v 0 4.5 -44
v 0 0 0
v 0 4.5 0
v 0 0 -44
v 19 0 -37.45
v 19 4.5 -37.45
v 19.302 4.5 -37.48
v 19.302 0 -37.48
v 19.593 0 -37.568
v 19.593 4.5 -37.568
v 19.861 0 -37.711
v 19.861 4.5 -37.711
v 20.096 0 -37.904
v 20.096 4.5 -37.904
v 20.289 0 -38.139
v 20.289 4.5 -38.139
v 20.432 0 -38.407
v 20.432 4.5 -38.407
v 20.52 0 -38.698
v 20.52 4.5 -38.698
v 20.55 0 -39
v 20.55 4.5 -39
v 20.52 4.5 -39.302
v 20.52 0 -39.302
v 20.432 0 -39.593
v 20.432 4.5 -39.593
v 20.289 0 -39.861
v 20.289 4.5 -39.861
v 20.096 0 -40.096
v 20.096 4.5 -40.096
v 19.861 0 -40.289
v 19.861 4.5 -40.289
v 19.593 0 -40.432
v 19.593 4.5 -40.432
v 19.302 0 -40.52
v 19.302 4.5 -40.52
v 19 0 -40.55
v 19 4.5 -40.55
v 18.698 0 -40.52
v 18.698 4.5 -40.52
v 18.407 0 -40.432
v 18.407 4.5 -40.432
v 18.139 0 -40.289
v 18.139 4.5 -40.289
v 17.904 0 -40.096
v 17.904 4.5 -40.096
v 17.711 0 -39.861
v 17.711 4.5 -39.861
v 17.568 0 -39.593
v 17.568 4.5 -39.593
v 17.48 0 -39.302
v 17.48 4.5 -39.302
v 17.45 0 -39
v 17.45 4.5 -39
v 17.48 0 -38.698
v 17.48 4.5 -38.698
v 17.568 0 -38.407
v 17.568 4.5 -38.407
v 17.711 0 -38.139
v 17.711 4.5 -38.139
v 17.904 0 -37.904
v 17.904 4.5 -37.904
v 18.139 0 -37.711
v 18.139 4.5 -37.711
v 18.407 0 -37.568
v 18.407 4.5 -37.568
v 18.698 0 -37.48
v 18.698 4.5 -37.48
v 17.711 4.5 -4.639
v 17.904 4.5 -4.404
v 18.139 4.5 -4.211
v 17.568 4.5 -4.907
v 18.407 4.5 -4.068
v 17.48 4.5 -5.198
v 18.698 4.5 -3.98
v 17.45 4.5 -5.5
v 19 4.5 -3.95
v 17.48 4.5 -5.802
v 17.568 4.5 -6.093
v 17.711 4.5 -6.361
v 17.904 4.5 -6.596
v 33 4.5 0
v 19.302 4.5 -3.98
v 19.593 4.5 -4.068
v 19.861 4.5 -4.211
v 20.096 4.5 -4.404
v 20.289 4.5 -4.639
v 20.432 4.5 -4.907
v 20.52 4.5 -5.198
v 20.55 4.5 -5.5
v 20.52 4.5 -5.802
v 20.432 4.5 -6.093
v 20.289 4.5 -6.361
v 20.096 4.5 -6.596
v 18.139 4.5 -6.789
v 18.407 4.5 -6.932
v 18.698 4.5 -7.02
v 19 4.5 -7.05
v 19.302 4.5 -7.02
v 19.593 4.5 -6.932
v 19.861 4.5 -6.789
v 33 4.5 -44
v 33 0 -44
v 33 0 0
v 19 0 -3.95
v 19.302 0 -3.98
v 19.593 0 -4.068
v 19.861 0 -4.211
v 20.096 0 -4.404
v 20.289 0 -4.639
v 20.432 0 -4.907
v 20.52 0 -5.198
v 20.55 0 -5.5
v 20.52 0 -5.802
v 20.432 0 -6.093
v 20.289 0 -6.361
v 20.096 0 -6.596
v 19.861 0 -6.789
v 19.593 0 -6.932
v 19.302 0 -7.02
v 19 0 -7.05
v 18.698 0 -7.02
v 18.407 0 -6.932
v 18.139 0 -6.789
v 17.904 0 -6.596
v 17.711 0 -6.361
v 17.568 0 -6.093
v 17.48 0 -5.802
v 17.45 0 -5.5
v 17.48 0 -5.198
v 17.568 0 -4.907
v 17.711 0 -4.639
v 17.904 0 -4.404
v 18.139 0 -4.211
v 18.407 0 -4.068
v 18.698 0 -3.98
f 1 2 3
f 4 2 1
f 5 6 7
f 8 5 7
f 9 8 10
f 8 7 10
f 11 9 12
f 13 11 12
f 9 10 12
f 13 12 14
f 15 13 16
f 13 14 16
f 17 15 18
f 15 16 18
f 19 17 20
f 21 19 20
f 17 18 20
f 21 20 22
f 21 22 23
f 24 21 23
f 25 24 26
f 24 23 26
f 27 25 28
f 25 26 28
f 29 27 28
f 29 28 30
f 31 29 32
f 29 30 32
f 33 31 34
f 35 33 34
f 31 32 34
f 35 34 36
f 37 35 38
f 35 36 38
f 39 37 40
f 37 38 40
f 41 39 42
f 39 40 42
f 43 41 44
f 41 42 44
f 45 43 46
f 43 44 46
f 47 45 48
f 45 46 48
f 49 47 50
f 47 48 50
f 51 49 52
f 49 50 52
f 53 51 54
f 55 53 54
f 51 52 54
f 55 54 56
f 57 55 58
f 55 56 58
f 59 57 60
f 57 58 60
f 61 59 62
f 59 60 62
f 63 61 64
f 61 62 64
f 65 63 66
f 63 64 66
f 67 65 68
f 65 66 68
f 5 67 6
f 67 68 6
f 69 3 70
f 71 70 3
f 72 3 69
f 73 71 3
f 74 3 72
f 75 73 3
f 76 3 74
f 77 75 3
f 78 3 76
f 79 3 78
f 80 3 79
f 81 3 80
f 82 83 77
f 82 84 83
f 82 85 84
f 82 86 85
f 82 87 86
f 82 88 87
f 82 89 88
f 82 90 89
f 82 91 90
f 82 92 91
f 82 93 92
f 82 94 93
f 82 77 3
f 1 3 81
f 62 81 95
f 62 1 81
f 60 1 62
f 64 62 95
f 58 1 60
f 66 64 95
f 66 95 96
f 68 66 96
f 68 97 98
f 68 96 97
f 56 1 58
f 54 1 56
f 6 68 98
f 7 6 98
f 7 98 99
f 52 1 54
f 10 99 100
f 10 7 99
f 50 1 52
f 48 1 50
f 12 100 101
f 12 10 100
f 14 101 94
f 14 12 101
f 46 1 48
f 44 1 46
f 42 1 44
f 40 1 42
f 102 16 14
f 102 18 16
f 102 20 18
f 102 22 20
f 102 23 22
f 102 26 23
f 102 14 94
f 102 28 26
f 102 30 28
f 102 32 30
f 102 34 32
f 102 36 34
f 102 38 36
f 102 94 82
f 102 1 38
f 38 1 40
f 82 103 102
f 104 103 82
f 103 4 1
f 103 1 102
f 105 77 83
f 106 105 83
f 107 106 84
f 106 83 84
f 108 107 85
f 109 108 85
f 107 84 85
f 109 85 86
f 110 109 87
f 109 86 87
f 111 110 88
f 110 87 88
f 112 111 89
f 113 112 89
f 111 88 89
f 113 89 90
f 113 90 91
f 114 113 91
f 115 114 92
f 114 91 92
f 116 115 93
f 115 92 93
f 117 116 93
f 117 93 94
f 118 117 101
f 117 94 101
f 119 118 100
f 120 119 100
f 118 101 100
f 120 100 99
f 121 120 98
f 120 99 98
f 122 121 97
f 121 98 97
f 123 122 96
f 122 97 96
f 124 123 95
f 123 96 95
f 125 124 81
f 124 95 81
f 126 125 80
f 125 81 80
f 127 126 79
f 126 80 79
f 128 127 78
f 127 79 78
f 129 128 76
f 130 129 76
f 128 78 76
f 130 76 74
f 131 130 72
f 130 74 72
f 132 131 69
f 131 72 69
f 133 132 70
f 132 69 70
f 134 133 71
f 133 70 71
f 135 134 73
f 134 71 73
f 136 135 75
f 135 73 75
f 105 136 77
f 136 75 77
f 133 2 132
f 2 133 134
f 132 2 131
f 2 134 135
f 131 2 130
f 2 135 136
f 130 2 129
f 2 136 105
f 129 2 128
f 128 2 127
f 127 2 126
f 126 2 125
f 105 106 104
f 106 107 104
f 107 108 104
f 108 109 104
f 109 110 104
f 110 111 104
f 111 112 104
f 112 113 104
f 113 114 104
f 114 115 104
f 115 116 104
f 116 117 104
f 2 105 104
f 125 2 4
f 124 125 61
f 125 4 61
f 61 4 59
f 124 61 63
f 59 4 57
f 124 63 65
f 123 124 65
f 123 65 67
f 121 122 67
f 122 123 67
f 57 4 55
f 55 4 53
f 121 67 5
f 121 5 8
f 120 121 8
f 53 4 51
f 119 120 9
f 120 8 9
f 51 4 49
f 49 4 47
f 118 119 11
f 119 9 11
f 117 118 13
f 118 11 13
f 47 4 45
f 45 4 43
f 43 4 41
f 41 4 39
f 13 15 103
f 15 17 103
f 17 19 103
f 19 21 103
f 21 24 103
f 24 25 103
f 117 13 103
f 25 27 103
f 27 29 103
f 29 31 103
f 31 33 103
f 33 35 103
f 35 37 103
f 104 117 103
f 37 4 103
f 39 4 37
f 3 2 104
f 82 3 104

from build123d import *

# Parameters (mm, degrees)
CROQUIS1_W              = 37
CROQUIS1_H              = 44
SALIENTE_EXTRUIR1_DEPTH = 4.5
CROQUIS2_R              = 1.55
CORTAR_EXTRUIR1_DEPTH   = 4.5
CROQUIS3_W              = 1.5
CROQUIS3_H              = 44
CORTAR_EXTRUIR2_DEPTH   = 1
CROQUIS4_W              = 1.5
CROQUIS4_H              = 44
CORTAR_EXTRUIR3_DEPTH   = 1
CROQUIS8_W              = 4
CROQUIS8_H              = 44
CORTAR_EXTRUIR4_DEPTH   = 4.5


with BuildPart() as part:
    # Croquis1 → Saliente-Extruir1 (new body)
    with BuildSketch(Plane(origin=(0, 0, 0), x_dir=(1, 0, 0), z_dir=(0, 1, 0))):
        with Locations((18.5, 22)):
            Rectangle(CROQUIS1_W, CROQUIS1_H)
    extrude(amount=SALIENTE_EXTRUIR1_DEPTH)

    # Croquis2 → Cortar-Extruir1 (cut)
    with BuildSketch(Plane(origin=(0, 4.5, 0), x_dir=(1, 0, 0), z_dir=(0, 1, 0))):
        with Locations(Location((19, 39, 0), (0, 0, 270))):
            Circle(CROQUIS2_R)
        with Locations(Location((19, 5.5, 0), (0, 0, 270))):
            Circle(CROQUIS2_R)
    extrude(amount=-CORTAR_EXTRUIR1_DEPTH, mode=Mode.SUBTRACT)

    # Croquis3 → Cortar-Extruir2 (cut)
    with BuildSketch(Plane(origin=(0, 4.5, 0), x_dir=(1, 0, 0), z_dir=(0, 1, 0))):
        with Locations((33.75, 22)):
            Rectangle(CROQUIS3_W, CROQUIS3_H)
    extrude(amount=-CORTAR_EXTRUIR2_DEPTH, mode=Mode.SUBTRACT)

    # Croquis4 → Cortar-Extruir3 (cut)
    with BuildSketch(Plane.XZ):
        with Locations((33.75, -22)):
            Rectangle(CROQUIS4_W, CROQUIS4_H)
    extrude(amount=-CORTAR_EXTRUIR3_DEPTH, mode=Mode.SUBTRACT)

    # Croquis8 → Cortar-Extruir4 (cut)
    with BuildSketch(Plane(origin=(0, 4.5, 0), x_dir=(1, 0, 0), z_dir=(0, 1, 0))):
        with Locations((35, 22)):
            Rectangle(CROQUIS8_W, CROQUIS8_H)
    extrude(amount=-CORTAR_EXTRUIR4_DEPTH, mode=Mode.SUBTRACT)


solid = part.part
